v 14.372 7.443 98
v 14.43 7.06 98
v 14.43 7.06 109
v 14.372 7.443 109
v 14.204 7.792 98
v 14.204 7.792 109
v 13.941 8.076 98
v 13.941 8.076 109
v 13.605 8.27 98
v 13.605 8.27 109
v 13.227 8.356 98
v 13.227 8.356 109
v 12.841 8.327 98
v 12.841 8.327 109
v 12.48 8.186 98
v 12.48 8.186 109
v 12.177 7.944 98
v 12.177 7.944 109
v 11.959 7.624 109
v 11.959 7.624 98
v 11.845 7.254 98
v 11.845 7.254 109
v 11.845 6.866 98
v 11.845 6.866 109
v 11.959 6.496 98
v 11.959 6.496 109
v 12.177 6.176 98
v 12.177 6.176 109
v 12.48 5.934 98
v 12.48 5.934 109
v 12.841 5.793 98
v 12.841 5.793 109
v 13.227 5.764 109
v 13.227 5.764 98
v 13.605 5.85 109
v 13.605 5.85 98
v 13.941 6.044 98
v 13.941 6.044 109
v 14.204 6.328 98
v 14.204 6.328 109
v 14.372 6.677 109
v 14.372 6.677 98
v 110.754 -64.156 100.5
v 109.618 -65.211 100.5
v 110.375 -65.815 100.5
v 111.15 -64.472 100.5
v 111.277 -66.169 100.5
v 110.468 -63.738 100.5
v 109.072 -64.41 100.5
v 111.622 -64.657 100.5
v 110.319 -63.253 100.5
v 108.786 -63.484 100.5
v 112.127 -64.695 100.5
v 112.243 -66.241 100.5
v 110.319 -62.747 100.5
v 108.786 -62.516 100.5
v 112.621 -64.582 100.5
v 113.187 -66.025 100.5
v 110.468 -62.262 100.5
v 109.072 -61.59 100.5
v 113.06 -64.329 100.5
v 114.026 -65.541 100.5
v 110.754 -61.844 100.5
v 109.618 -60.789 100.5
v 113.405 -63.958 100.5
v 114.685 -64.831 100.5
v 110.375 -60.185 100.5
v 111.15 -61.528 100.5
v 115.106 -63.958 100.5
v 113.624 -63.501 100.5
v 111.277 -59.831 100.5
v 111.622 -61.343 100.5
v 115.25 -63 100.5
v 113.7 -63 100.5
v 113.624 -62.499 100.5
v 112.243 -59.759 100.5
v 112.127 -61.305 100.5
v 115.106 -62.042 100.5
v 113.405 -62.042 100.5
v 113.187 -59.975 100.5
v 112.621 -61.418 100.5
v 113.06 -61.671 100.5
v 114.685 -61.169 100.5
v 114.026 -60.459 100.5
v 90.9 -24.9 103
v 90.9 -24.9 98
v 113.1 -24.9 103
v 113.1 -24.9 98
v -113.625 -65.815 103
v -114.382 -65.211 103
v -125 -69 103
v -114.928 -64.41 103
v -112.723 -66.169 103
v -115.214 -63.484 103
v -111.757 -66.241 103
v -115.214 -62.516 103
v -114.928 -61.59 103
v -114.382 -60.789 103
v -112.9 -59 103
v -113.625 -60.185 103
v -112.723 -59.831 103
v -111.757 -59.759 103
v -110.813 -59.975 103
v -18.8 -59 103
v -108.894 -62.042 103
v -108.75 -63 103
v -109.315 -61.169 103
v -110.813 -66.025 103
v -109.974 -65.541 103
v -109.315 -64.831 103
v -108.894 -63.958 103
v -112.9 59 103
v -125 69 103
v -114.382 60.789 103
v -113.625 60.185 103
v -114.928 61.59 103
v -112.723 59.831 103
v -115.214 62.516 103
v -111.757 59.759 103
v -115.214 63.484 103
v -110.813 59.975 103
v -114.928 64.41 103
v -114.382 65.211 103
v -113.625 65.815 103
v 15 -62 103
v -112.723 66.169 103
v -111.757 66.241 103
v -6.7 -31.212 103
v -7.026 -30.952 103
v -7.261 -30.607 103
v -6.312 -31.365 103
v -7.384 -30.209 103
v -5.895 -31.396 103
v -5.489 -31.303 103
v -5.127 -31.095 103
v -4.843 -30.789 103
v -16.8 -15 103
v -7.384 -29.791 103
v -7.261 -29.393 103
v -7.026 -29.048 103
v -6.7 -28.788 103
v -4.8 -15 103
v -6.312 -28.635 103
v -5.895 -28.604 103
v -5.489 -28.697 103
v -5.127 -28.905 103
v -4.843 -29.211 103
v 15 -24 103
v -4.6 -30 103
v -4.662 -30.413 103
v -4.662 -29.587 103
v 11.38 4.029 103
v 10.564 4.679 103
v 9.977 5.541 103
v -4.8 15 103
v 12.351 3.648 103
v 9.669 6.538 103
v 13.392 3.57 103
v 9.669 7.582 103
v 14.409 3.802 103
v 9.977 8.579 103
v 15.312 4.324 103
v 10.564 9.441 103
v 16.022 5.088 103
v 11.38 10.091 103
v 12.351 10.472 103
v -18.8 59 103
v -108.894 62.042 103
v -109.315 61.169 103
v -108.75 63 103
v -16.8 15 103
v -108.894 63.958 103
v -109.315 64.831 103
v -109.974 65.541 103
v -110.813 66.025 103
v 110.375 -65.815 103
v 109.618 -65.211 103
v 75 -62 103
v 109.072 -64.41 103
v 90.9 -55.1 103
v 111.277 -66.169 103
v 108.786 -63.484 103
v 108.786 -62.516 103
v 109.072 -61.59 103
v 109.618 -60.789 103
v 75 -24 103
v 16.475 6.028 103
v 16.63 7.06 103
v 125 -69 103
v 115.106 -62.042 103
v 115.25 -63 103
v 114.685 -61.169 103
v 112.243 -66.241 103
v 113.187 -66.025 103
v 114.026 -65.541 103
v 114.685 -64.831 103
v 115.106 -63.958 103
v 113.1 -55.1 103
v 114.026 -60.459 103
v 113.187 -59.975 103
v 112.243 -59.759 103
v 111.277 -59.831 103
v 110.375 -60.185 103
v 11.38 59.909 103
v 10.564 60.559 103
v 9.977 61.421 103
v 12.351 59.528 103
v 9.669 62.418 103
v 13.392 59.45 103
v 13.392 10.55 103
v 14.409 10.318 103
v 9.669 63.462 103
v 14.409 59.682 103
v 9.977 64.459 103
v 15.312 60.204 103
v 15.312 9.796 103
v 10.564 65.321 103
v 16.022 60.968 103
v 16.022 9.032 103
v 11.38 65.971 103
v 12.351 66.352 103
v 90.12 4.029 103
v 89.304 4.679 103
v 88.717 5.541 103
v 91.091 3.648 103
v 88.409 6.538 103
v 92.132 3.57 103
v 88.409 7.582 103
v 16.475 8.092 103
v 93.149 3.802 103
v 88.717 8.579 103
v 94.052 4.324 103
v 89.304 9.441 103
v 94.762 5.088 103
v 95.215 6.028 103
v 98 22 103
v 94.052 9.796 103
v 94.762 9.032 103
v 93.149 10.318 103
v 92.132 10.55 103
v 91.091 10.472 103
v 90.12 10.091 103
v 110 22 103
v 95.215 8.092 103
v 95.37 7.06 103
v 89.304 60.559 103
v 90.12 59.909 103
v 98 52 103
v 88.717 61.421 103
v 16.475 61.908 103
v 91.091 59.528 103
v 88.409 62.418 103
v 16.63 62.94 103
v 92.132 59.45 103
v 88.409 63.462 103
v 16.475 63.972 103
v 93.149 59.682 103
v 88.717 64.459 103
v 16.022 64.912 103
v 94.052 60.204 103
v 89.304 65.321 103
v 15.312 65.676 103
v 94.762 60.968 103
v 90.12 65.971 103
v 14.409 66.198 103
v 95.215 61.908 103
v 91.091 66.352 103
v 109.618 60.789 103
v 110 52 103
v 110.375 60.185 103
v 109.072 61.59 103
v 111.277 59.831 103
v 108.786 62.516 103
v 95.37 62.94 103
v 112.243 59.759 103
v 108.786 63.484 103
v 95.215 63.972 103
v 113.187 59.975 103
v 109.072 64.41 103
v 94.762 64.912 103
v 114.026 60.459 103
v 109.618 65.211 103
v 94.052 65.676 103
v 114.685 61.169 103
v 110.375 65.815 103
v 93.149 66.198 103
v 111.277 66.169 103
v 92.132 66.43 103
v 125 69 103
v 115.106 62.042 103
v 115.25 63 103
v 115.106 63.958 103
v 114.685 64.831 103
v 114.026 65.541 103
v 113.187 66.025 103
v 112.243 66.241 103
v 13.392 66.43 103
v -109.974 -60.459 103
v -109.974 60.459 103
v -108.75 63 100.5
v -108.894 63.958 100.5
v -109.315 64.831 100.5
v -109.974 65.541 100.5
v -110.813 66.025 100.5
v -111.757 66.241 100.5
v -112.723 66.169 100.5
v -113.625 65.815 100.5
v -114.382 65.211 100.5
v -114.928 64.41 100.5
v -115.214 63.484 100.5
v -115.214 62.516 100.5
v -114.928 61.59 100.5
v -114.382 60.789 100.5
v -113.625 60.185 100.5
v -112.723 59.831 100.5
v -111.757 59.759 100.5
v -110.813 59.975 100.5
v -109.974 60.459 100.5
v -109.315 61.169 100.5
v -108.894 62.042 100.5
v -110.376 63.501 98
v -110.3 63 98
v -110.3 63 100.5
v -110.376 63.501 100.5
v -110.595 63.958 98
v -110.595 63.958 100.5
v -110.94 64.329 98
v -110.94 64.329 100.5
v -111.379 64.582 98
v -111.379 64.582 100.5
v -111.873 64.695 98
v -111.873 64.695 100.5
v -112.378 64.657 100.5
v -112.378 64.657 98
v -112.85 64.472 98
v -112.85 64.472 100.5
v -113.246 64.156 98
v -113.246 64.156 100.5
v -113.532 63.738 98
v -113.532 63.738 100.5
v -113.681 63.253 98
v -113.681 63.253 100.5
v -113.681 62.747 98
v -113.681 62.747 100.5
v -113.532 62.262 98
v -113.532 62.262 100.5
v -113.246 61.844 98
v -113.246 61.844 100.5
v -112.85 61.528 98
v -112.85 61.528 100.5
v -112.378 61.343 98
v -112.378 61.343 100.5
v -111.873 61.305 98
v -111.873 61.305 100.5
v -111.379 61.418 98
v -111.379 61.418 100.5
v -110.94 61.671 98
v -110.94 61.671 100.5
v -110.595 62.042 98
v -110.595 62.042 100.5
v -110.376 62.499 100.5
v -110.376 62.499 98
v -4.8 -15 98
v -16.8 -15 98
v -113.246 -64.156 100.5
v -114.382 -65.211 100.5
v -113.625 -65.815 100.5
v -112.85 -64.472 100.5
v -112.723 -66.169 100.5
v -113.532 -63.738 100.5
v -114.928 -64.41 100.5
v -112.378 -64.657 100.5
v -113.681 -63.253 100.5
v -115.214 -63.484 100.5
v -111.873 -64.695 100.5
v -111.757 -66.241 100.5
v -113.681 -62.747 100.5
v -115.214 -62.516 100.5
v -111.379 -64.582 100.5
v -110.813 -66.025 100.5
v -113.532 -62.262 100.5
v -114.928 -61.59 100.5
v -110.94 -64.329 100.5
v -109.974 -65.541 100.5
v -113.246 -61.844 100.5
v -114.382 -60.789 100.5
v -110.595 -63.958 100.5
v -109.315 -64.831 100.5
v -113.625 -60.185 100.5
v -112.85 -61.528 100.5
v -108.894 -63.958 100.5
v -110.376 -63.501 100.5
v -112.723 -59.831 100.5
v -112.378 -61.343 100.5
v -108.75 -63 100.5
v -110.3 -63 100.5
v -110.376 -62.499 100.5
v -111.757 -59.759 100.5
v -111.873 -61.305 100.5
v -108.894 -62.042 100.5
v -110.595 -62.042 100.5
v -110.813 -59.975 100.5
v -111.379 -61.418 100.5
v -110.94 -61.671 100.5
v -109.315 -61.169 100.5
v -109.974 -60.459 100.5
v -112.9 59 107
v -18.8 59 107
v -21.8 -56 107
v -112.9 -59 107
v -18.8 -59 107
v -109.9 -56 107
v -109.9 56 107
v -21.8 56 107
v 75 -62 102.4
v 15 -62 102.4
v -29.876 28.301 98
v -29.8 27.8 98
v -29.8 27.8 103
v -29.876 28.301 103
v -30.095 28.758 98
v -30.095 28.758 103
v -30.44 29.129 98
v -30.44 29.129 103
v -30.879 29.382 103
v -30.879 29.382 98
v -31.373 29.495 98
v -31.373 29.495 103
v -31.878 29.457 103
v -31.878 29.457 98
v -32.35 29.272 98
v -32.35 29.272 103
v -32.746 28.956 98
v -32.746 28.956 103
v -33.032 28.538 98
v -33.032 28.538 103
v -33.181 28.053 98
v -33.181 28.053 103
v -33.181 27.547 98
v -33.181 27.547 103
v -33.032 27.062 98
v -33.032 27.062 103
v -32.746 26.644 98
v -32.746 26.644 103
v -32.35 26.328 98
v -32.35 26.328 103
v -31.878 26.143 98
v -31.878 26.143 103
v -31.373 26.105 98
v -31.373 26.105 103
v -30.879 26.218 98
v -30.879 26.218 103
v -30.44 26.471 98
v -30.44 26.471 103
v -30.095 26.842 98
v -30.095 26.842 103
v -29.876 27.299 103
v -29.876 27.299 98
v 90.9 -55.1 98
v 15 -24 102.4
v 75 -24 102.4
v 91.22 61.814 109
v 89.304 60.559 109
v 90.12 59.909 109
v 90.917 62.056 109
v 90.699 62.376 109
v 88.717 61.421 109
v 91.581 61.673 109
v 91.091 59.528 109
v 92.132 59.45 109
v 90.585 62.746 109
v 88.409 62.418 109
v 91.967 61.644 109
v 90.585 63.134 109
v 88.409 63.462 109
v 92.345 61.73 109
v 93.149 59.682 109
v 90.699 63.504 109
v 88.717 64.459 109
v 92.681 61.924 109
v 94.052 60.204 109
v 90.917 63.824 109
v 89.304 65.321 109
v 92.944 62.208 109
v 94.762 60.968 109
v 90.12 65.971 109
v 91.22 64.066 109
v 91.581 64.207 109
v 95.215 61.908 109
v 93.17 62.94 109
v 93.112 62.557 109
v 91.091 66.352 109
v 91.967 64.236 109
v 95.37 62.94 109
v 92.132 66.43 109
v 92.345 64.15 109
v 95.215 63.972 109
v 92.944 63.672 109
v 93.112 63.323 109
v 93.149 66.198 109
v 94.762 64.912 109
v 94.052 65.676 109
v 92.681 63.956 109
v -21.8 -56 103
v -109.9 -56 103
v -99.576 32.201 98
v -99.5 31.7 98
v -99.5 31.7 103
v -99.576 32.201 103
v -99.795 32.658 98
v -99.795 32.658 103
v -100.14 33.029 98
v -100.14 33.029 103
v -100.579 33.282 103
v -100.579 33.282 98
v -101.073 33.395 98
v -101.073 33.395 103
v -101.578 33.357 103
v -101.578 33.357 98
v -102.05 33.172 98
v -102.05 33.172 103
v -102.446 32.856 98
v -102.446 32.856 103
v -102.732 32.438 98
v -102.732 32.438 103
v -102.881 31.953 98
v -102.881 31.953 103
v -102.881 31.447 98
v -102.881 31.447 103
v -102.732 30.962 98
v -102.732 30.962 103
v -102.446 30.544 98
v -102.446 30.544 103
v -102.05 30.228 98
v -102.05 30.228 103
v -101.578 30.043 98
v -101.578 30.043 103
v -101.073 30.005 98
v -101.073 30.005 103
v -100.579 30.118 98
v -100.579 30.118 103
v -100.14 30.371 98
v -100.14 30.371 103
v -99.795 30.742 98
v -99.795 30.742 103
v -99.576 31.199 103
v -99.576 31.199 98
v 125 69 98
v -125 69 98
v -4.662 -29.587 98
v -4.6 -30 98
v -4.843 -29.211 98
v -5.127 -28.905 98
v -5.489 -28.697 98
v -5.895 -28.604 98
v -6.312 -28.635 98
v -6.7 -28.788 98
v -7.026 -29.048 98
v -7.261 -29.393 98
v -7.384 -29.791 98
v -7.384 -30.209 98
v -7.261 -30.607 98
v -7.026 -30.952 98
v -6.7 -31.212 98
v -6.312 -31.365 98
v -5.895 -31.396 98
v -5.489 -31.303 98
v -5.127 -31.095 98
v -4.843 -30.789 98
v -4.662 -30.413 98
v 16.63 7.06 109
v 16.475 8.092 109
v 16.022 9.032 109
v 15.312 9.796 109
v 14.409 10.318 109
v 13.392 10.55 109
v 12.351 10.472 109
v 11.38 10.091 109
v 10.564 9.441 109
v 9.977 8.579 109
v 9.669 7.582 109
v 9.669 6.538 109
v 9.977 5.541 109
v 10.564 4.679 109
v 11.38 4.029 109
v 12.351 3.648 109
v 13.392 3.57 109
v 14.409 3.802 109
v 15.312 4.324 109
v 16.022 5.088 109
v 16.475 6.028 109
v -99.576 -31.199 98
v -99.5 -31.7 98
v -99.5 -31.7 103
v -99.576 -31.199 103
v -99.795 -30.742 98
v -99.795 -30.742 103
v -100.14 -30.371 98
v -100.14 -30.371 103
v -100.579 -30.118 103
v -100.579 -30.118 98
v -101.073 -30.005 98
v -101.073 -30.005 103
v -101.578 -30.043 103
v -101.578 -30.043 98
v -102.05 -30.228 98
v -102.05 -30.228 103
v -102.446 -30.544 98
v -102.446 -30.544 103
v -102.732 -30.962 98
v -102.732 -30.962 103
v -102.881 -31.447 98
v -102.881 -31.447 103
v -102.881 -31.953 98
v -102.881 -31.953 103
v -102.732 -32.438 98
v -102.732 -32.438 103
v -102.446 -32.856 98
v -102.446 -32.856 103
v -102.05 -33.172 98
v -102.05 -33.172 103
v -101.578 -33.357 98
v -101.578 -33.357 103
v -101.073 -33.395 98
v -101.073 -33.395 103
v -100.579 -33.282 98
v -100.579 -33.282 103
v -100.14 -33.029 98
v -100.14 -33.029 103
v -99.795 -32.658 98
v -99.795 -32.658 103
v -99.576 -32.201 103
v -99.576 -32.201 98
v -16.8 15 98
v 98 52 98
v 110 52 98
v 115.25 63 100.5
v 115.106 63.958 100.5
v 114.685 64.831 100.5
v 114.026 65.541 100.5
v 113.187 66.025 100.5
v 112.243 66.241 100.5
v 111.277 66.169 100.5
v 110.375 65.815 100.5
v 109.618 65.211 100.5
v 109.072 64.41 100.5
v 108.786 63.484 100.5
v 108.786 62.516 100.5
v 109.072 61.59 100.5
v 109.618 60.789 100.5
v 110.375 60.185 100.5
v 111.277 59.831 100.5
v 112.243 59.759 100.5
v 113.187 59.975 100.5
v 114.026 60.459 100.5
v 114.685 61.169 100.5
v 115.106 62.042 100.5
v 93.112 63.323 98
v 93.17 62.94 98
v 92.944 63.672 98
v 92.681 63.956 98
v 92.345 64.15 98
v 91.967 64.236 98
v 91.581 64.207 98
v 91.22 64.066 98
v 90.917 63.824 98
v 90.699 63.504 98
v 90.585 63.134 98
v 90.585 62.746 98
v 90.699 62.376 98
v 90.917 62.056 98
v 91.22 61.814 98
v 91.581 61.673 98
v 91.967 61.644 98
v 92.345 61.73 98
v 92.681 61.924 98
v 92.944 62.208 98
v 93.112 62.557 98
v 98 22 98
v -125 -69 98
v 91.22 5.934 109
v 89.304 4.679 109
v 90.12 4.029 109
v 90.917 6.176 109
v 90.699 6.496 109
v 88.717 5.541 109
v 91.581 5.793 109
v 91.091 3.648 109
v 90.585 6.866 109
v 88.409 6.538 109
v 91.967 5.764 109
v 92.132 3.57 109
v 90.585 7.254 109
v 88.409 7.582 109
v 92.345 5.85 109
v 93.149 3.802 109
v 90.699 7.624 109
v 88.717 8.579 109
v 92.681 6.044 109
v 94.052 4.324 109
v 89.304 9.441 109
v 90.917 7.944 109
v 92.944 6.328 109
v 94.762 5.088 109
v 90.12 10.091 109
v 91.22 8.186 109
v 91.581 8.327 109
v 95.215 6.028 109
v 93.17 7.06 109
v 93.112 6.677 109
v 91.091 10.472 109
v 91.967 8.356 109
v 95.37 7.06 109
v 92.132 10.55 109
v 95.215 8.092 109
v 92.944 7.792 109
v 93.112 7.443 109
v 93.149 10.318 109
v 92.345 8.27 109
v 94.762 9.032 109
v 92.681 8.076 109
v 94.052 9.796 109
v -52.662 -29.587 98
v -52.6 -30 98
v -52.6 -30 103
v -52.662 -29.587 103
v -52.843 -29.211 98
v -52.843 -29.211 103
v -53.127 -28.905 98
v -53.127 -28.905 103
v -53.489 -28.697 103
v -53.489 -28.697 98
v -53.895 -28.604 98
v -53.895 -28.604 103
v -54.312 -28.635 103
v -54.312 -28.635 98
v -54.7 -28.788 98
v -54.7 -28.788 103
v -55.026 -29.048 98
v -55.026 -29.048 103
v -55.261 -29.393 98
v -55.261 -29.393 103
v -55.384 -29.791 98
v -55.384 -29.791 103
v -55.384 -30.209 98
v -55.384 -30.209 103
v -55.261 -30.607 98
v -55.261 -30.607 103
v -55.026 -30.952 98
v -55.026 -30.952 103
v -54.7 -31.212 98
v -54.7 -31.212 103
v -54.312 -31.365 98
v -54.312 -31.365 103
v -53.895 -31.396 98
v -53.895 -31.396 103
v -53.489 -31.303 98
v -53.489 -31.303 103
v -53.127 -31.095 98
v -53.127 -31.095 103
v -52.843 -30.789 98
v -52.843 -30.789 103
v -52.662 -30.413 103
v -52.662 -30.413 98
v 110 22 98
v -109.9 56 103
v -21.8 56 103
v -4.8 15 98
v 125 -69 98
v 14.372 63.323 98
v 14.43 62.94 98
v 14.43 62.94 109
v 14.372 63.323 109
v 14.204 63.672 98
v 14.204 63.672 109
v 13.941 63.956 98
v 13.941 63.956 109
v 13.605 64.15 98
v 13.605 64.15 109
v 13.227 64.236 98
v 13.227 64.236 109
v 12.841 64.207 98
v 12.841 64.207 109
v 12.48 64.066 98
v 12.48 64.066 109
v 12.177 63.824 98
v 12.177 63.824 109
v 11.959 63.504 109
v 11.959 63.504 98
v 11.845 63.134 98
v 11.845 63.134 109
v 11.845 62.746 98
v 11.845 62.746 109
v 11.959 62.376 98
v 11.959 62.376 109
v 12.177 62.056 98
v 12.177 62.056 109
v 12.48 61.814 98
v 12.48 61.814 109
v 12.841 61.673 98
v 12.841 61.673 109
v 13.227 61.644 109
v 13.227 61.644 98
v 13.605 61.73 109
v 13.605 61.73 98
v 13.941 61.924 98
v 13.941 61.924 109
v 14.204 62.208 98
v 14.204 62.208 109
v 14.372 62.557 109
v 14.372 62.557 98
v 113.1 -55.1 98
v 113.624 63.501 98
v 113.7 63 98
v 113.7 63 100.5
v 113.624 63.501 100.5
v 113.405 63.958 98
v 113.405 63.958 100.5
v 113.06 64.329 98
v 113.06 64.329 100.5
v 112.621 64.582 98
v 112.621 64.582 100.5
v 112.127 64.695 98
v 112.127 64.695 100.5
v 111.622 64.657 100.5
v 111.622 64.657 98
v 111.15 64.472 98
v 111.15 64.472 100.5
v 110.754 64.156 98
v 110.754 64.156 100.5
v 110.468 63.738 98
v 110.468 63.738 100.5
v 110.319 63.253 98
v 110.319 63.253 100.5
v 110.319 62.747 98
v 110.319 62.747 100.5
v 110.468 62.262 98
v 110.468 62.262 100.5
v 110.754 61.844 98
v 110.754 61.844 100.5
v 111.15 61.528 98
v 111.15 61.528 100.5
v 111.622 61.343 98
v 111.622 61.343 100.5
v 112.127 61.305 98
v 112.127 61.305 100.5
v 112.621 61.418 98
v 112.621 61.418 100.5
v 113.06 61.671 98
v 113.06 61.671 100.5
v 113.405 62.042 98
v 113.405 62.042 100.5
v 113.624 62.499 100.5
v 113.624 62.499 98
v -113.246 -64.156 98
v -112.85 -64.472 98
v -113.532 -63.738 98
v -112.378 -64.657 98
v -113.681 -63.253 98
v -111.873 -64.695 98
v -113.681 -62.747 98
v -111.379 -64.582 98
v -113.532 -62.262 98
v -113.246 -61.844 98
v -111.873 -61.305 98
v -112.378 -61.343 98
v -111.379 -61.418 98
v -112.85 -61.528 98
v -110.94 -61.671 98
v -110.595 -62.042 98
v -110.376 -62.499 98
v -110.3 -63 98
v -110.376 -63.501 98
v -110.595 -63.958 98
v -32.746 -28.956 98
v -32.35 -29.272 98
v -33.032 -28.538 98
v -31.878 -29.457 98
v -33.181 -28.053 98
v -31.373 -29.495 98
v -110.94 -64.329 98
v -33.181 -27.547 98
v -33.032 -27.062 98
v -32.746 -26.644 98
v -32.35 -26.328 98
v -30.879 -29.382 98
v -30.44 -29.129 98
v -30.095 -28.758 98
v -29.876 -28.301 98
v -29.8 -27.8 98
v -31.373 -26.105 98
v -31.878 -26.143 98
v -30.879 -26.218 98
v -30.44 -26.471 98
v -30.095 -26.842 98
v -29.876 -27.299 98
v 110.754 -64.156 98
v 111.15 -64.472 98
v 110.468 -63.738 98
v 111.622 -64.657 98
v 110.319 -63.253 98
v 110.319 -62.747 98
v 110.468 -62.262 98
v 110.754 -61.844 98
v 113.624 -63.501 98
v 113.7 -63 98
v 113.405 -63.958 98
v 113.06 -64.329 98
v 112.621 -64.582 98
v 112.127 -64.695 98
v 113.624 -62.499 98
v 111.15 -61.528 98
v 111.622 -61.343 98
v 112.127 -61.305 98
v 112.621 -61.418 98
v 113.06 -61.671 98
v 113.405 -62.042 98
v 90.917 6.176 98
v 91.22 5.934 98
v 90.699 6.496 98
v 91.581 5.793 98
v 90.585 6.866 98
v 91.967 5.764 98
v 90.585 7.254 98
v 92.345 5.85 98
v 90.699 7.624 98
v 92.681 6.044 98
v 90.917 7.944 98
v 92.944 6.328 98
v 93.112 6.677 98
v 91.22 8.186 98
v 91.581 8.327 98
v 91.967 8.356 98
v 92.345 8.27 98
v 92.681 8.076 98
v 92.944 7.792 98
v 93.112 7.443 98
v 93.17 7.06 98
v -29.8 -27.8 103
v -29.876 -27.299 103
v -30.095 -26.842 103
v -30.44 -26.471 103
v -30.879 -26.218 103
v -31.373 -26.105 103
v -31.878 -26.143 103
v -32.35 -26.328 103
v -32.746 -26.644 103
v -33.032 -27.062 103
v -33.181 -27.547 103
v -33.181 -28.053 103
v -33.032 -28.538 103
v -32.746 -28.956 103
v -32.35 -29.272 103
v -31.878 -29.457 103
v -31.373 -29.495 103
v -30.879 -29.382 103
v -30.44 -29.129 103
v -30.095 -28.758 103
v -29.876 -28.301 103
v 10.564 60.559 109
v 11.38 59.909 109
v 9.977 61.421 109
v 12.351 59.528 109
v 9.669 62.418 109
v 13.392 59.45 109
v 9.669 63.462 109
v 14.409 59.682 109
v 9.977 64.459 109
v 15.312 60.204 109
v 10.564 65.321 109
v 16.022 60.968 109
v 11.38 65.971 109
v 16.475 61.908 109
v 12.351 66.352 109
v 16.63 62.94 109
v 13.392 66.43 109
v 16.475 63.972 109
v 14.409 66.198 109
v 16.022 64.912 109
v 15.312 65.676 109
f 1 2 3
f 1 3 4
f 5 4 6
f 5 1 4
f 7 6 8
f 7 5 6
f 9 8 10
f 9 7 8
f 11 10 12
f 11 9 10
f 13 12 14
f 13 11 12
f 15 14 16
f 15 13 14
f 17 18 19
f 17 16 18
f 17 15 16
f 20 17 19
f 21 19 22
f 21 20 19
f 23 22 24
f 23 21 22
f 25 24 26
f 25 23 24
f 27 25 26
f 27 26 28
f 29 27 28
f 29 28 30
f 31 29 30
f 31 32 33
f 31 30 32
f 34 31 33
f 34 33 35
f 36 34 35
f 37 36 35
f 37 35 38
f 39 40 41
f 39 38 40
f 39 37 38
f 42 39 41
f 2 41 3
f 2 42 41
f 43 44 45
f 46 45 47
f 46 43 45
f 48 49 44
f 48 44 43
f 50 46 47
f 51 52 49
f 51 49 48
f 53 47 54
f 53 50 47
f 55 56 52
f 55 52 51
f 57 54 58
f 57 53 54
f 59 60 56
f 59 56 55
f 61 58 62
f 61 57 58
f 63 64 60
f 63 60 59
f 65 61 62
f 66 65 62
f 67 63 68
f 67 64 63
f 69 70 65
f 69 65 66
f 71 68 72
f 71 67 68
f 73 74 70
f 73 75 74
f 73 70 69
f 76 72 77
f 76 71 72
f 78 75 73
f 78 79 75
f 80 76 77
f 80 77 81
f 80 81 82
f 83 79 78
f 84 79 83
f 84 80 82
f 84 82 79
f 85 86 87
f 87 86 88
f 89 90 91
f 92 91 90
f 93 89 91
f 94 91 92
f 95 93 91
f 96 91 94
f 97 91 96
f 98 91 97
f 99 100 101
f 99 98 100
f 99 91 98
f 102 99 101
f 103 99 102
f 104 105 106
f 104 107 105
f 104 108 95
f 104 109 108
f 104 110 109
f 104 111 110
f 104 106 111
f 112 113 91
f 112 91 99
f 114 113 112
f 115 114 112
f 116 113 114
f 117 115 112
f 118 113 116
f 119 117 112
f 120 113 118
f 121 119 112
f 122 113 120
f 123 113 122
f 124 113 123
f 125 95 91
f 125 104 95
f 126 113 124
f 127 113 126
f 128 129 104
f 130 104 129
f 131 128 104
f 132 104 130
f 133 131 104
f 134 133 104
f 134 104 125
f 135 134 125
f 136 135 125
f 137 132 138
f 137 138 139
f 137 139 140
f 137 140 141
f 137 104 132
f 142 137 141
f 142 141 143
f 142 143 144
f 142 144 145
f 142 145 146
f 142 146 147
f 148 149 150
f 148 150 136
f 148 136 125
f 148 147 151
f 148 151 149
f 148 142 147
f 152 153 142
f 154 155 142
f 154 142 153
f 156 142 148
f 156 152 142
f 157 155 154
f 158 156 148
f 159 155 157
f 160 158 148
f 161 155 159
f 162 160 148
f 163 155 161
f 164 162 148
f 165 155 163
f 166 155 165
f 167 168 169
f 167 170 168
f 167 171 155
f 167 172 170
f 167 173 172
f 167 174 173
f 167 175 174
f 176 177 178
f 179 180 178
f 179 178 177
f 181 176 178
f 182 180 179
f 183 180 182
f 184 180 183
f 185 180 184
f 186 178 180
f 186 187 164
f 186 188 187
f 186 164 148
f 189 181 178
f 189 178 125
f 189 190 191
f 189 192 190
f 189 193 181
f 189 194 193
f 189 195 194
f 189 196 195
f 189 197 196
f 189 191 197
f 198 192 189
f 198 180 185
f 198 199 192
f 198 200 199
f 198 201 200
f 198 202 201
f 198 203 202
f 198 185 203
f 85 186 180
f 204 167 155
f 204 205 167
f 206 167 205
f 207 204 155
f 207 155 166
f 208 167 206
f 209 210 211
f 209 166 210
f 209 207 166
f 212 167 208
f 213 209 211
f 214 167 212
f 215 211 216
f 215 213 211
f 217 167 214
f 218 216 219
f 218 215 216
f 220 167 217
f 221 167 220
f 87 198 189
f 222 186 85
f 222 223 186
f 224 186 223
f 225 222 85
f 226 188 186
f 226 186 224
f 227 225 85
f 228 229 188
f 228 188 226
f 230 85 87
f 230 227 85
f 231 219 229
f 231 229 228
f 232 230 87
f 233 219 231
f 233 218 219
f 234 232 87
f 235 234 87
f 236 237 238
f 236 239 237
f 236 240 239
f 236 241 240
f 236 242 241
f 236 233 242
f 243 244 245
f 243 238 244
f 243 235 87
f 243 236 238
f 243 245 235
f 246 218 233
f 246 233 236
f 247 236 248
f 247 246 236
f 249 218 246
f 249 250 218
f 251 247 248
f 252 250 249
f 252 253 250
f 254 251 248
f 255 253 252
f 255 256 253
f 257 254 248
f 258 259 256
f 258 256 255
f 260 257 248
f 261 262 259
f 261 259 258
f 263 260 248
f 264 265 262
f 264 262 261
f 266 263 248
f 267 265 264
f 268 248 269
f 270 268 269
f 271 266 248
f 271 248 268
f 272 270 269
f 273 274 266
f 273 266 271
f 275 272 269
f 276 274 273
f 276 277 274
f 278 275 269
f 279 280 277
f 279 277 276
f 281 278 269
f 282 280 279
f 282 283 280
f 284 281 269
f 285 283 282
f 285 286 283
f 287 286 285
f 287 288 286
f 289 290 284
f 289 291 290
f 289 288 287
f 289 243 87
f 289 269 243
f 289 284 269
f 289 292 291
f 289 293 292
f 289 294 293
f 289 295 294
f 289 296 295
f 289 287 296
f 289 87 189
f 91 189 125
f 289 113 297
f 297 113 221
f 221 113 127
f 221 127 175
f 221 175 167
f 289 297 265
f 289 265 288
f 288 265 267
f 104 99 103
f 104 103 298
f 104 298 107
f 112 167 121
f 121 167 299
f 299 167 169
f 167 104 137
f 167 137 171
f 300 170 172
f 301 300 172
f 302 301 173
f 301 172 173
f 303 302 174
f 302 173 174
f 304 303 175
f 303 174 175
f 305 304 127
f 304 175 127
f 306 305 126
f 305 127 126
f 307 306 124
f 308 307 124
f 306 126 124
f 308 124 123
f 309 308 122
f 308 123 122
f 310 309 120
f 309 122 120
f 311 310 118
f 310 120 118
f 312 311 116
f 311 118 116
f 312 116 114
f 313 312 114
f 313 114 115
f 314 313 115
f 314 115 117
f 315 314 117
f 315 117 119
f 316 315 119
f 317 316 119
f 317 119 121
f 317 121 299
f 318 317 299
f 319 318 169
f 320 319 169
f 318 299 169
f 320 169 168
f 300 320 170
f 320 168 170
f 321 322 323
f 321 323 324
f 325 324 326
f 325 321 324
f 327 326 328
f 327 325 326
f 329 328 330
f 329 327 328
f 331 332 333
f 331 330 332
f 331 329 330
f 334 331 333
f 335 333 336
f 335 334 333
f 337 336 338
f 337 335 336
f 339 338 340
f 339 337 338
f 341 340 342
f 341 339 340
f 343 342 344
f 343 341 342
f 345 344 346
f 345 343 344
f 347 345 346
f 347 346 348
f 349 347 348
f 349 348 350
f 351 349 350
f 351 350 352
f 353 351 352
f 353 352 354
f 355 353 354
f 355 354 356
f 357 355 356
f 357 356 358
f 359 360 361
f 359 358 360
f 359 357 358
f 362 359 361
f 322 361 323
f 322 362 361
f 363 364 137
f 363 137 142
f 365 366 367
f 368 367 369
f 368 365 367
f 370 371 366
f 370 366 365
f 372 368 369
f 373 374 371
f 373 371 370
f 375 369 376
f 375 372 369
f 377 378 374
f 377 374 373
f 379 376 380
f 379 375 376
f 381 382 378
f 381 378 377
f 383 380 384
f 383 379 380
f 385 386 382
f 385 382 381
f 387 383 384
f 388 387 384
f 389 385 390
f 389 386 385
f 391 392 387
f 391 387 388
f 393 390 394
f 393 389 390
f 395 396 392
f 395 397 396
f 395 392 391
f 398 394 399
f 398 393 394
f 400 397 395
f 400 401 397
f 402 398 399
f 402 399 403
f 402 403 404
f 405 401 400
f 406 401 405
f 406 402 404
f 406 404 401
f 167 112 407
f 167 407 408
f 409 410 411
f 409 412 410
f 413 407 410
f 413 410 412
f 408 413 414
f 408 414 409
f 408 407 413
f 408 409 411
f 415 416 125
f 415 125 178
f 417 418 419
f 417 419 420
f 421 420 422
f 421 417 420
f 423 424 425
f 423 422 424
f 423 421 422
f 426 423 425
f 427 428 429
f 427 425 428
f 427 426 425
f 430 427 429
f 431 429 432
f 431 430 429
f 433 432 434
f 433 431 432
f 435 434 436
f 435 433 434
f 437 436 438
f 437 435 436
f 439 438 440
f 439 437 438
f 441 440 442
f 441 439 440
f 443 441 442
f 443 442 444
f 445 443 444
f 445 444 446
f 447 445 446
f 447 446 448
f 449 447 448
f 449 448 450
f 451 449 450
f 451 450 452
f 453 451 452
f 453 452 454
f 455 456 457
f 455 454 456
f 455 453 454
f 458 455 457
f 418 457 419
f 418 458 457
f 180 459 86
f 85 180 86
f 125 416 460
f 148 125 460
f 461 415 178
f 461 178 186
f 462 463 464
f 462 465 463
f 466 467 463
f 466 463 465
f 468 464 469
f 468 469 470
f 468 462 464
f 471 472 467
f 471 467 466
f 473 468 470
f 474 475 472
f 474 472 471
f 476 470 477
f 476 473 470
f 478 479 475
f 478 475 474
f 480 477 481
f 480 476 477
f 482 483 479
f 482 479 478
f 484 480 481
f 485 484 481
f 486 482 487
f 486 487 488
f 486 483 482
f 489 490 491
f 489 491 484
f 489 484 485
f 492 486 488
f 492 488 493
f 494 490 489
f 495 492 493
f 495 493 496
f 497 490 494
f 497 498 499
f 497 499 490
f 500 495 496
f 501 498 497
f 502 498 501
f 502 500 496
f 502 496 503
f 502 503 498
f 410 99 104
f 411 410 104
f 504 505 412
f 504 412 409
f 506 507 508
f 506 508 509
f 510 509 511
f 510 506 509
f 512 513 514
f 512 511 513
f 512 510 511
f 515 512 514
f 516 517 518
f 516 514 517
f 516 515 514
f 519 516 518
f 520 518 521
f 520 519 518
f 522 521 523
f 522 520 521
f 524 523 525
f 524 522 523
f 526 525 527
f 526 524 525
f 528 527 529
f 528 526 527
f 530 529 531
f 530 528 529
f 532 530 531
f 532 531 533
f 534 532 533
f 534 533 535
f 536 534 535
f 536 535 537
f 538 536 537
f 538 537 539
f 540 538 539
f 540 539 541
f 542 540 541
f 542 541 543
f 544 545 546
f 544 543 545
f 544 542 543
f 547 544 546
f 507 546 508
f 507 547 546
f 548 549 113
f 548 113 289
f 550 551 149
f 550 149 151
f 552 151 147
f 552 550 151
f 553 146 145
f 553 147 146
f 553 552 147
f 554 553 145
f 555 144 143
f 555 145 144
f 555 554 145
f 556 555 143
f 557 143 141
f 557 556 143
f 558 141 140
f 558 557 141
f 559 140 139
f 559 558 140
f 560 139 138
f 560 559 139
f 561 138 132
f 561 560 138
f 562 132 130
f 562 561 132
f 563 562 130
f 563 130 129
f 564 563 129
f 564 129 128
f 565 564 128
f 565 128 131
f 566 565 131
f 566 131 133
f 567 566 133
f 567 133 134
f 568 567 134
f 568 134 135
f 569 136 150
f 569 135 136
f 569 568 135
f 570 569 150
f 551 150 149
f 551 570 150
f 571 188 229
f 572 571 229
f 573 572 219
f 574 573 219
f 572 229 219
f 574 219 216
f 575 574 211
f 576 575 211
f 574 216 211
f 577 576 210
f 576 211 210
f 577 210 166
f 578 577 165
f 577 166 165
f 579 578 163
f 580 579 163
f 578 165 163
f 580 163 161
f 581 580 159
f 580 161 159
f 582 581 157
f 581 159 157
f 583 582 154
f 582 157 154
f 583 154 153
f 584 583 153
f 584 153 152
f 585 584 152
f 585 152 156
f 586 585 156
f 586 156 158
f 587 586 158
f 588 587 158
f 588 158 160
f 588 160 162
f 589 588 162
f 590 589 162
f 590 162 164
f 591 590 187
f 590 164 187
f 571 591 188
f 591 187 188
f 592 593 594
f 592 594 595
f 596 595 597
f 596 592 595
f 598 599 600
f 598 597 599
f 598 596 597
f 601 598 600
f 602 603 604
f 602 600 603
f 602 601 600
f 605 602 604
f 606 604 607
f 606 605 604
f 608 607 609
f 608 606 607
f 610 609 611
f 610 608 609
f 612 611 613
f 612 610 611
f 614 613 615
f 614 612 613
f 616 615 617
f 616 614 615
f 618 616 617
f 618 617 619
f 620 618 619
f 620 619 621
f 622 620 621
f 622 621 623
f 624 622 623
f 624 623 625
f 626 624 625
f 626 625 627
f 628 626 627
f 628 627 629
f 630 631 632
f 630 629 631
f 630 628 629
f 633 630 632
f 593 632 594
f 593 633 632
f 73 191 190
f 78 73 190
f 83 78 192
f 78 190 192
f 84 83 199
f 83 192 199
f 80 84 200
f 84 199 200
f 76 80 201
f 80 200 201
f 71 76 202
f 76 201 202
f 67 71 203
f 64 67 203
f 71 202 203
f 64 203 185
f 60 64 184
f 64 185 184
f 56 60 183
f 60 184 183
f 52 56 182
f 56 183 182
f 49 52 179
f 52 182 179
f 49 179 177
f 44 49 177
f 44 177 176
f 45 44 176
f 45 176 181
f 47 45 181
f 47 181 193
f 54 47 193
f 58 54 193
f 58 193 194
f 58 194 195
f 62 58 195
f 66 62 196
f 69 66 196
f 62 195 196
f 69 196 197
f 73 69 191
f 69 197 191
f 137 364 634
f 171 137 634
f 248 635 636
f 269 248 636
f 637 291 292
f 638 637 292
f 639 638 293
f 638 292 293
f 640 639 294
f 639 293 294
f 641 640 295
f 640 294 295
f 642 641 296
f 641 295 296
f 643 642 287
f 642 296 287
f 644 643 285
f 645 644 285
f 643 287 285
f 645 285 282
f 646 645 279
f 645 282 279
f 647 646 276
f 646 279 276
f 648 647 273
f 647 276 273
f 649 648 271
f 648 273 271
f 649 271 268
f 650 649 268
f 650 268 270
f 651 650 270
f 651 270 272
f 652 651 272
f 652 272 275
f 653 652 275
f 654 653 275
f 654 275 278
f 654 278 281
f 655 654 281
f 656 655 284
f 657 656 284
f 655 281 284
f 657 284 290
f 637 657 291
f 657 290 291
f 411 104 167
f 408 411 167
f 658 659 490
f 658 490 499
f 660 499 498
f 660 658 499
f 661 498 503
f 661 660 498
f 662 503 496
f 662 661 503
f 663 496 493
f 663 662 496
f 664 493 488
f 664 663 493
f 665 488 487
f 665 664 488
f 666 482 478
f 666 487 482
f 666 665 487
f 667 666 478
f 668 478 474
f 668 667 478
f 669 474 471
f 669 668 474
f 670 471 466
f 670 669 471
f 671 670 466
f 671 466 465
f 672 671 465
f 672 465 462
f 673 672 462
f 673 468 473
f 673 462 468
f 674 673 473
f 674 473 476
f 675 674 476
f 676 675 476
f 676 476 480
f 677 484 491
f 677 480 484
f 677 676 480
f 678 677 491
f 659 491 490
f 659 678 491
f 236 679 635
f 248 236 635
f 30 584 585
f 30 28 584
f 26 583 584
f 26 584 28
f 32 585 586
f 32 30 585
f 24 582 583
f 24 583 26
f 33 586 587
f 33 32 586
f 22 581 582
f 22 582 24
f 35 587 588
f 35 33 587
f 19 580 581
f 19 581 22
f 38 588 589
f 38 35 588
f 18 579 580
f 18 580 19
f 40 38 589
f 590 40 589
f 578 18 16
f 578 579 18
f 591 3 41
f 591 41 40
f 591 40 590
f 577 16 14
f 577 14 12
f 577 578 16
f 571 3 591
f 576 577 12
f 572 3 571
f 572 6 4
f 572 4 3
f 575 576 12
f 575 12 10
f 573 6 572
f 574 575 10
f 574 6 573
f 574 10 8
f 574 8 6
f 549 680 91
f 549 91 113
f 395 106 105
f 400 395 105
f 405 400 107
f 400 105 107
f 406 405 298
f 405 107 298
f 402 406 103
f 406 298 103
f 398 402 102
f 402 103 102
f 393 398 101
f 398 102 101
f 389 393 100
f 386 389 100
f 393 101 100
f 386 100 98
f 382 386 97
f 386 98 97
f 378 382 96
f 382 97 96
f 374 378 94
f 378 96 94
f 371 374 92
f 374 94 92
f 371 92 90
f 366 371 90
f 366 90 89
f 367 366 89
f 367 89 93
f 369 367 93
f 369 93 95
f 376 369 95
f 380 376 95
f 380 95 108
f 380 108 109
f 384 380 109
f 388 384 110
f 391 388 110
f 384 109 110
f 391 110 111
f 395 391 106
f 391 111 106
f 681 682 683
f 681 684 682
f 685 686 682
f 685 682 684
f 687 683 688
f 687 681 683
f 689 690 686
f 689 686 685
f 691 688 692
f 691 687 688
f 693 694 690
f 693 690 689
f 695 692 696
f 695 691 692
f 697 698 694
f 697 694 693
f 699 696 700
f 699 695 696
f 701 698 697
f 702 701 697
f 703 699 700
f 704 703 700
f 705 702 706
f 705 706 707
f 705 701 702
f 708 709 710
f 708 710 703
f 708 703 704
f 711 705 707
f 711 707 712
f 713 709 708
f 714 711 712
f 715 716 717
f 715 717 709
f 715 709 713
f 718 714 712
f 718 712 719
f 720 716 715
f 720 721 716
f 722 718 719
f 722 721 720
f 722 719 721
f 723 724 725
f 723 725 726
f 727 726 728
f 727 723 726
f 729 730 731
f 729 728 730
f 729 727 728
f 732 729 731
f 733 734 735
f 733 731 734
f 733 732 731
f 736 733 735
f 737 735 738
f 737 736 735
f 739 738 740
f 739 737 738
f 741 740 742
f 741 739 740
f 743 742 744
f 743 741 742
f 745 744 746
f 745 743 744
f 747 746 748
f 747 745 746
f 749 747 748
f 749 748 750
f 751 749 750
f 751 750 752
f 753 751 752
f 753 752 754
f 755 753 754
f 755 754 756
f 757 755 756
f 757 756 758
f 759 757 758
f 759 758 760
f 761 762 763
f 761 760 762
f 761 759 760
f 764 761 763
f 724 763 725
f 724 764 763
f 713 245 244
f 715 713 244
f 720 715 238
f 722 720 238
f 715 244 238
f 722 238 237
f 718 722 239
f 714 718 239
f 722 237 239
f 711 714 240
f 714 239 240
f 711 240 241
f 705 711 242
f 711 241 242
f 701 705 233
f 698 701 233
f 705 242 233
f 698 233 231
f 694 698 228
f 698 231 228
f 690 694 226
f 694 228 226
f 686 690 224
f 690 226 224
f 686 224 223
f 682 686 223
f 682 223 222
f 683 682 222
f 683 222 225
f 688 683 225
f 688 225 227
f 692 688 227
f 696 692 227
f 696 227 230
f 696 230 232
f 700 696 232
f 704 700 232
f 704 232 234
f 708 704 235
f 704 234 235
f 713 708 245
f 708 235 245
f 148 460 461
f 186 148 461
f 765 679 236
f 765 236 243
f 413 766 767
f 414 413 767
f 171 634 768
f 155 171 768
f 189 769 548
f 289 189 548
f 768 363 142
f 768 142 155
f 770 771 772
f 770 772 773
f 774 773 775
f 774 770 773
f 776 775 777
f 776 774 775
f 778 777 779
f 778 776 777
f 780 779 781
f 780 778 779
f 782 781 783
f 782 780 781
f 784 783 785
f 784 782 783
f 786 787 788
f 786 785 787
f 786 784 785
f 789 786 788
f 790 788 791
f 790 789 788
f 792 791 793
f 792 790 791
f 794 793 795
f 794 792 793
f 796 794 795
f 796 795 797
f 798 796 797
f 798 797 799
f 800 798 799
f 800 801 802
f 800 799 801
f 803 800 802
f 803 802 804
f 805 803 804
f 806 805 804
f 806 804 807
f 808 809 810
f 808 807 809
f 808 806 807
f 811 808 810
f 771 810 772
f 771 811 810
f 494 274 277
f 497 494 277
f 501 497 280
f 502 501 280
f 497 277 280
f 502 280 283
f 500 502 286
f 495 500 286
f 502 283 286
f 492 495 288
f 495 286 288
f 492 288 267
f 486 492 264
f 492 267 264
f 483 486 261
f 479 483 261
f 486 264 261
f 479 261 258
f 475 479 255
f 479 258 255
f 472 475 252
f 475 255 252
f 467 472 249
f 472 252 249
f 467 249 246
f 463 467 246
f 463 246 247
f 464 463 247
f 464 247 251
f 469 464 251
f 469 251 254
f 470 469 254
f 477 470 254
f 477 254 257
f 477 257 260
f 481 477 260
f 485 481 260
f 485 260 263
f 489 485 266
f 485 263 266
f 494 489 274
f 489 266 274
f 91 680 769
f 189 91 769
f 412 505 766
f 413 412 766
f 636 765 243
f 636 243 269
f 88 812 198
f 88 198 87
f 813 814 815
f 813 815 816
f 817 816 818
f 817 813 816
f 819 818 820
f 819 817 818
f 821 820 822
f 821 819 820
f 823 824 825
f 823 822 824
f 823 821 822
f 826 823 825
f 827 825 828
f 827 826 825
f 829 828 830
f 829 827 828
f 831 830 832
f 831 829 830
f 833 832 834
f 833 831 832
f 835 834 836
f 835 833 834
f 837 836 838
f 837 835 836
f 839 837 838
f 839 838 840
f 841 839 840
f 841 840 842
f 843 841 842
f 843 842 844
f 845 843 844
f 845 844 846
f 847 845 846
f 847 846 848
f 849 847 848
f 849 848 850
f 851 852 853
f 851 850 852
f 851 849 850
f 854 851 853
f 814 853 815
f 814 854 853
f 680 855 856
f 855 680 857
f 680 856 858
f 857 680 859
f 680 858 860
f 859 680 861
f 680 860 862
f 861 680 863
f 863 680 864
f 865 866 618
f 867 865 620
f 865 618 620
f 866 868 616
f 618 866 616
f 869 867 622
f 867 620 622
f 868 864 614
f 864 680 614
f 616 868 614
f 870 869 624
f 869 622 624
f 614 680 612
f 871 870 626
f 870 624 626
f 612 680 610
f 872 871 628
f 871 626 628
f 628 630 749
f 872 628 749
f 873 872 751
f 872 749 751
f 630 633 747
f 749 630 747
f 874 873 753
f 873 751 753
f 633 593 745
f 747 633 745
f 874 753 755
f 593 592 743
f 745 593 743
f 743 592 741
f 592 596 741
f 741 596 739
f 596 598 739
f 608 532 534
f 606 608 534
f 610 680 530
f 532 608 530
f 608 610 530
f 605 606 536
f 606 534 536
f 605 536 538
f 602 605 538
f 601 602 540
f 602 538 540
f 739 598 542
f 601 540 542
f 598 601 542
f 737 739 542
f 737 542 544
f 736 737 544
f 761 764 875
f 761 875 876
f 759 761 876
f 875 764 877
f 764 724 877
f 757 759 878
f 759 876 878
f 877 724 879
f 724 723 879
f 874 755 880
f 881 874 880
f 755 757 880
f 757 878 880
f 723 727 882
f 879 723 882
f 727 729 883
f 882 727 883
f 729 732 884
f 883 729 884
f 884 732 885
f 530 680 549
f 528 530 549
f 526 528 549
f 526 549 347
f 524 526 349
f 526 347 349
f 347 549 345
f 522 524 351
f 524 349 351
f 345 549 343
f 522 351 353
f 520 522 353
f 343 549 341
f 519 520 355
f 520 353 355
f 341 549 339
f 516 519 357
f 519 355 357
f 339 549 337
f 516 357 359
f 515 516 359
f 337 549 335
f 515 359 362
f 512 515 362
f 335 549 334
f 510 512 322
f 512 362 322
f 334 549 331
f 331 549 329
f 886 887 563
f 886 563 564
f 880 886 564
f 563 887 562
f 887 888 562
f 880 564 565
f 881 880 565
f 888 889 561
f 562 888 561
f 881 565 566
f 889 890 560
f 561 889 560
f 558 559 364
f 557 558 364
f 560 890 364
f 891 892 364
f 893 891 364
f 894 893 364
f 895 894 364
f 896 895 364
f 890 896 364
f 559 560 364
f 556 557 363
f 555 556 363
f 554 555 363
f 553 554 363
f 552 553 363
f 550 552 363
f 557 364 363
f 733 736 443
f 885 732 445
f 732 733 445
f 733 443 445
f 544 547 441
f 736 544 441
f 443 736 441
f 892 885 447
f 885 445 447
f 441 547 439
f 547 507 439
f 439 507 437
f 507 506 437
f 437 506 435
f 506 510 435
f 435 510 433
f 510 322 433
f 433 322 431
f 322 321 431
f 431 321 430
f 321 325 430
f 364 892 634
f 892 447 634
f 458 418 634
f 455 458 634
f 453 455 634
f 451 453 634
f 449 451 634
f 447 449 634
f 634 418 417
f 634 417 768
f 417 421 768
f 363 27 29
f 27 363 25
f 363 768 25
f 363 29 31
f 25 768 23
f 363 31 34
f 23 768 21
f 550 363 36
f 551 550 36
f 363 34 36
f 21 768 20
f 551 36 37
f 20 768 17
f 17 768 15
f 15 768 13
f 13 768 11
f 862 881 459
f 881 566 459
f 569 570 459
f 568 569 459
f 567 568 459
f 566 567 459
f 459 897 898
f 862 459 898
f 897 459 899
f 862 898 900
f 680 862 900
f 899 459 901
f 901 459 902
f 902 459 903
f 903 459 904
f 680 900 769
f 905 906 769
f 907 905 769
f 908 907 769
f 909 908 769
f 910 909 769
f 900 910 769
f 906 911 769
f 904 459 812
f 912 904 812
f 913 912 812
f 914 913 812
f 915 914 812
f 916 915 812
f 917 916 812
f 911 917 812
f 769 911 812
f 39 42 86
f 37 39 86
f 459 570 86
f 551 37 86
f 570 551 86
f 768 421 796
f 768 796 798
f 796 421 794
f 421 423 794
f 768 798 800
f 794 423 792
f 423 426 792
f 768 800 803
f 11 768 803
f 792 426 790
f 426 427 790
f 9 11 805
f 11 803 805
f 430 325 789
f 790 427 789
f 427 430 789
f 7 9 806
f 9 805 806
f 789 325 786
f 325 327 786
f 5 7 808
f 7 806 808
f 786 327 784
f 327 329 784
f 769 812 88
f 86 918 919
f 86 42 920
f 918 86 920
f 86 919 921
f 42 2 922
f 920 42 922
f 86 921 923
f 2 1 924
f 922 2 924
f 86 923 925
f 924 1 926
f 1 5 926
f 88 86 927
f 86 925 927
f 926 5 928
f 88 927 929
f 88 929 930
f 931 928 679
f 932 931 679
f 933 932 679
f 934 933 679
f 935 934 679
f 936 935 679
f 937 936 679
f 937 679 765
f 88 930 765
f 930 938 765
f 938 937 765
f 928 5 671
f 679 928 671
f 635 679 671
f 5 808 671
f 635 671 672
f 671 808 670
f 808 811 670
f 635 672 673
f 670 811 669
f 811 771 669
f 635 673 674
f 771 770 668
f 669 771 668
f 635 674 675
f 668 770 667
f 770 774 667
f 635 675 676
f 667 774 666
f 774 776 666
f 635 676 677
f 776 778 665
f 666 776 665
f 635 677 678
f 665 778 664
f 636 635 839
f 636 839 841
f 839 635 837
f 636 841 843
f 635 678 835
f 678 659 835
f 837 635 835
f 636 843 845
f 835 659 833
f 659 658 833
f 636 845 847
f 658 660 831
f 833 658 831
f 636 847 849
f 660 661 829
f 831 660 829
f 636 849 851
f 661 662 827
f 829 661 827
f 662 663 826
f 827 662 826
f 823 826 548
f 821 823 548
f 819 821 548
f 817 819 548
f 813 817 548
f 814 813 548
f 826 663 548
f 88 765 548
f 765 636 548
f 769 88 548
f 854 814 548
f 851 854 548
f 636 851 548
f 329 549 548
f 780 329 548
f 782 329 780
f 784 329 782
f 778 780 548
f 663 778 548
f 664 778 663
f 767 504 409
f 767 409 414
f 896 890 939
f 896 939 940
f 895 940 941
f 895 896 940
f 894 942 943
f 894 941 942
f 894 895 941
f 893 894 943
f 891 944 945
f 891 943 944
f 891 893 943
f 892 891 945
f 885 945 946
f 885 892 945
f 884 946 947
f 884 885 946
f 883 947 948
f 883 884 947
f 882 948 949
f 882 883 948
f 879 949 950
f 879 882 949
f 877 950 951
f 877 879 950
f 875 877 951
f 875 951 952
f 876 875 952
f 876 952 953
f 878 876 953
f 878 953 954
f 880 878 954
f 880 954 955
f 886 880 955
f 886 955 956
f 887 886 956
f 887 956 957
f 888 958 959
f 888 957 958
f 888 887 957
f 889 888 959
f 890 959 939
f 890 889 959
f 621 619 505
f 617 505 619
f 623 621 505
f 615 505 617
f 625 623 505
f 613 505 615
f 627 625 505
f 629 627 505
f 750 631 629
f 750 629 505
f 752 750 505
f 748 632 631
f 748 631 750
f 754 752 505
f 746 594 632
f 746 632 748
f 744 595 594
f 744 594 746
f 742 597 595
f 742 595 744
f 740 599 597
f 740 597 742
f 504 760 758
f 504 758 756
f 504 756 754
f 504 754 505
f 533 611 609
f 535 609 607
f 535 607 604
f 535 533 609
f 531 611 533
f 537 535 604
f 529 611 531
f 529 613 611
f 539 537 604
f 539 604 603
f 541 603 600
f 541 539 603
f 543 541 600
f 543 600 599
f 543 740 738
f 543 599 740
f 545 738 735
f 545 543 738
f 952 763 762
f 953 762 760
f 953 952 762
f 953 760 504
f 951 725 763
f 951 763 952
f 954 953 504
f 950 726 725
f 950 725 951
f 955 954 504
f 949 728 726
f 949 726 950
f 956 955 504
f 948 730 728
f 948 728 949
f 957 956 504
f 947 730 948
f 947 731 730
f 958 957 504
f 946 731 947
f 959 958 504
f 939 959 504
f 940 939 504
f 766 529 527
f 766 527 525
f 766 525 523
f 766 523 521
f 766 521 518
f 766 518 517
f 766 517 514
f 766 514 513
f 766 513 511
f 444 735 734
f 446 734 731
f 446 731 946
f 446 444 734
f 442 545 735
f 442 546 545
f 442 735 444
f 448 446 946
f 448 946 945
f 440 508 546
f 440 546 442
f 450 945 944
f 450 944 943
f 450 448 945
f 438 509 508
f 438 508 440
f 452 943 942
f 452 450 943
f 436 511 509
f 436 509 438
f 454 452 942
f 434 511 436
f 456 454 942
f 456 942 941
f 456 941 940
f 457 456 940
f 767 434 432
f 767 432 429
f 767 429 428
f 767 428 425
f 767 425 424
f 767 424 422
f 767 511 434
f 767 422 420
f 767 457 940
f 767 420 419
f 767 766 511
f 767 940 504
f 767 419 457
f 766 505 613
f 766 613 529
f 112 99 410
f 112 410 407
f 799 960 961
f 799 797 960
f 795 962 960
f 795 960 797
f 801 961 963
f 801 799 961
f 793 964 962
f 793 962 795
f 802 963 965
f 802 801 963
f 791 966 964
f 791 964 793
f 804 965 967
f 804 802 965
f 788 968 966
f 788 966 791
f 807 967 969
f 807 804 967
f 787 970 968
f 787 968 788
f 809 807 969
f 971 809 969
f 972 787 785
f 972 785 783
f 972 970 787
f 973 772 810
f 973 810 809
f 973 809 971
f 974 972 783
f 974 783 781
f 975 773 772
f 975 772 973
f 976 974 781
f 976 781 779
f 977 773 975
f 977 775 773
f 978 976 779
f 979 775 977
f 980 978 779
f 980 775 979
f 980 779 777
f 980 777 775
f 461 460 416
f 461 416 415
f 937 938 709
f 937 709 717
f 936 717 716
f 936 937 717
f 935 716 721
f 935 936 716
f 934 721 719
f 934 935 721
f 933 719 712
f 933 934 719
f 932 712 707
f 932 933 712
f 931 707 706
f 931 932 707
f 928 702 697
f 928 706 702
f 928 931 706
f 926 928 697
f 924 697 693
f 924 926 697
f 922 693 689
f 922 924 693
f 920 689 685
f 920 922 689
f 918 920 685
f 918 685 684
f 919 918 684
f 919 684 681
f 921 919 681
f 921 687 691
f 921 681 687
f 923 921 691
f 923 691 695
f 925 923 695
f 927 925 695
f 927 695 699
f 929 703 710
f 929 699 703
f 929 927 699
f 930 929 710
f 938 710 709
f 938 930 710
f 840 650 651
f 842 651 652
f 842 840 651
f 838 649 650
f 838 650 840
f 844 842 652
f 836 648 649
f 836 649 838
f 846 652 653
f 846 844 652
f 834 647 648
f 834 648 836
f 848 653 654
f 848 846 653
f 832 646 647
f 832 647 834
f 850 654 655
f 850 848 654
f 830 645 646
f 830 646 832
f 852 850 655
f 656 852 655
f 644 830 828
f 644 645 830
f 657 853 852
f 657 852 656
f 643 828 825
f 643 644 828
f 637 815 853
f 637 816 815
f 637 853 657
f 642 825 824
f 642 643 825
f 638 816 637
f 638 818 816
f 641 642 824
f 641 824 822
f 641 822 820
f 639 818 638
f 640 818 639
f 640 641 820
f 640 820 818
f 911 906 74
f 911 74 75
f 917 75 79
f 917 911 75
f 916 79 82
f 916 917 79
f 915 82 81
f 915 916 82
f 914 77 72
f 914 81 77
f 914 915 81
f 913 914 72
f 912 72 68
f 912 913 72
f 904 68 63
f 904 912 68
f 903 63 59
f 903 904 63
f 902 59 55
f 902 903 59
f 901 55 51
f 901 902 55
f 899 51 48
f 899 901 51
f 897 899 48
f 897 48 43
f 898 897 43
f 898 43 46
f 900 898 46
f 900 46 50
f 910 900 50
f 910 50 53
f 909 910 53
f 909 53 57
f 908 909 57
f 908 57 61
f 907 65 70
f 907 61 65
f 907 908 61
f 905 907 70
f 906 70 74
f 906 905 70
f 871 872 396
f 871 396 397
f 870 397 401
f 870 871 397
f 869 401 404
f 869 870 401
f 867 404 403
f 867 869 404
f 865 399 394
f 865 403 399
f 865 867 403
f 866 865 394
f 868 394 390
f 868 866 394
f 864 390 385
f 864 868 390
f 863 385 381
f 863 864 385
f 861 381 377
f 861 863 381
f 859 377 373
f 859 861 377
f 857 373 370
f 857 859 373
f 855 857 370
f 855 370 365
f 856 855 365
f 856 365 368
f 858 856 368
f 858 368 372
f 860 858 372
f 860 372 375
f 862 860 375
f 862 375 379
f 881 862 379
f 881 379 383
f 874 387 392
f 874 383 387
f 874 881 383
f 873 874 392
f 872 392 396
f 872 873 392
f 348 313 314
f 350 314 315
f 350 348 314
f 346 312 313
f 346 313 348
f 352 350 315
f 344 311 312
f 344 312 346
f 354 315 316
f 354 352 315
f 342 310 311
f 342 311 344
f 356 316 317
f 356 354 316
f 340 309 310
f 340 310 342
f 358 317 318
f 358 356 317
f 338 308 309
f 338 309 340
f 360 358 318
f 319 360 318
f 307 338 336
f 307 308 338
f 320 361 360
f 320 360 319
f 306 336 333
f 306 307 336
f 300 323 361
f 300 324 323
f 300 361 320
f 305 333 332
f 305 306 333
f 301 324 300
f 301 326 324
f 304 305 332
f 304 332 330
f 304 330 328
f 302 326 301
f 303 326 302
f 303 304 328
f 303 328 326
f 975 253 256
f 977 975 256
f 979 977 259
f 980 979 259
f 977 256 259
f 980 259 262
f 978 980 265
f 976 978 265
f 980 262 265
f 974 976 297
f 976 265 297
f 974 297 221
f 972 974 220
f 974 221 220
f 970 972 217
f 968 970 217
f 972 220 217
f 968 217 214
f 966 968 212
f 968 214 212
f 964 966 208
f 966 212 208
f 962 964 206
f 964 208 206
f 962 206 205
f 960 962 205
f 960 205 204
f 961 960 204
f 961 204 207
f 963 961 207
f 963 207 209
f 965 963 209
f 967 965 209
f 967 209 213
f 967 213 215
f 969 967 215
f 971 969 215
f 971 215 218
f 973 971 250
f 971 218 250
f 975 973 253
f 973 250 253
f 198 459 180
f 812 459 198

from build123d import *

# Parameters (mm, degrees)
SKETCH1_W                       = 250
SKETCH1_H                       = 138
PLATE_DEPTH                     = 5
SKETCH2_W                       = 94.1
SKETCH2_H                       = 118
SKETCH2_W_2                     = 88.1
SKETCH2_H_2                     = 112
ARM_LOCATING_FENCE_DEPTH        = 4
SKETCH3_R                       = 1.7
ARM_M3_HOLES_DEPTH              = 7
SKETCH4_R                       = 1.7
DECK_M3_HOLES_DEPTH             = 7
SKETCH5_R                       = 3.25
DECK_COUNTERBORES_DEPTH         = 2.5
SKETCH6_W                       = 22.2
SKETCH6_H                       = 30.2
KILL_SWITCH_CUTOUT_DEPTH        = 7
SKETCH7_W                       = 12
SKETCH7_H                       = 30
SERVO_CABLE_SLOT_DEPTH          = 7
SKETCH8_R                       = 1.4
ESP32_STANDOFF_HOLES_M2P5_DEPTH = 7
SKETCH9_R                       = 3.5
MDD10A_BOSSES_DEPTH             = 6
SKETCH10_R                      = 1.3
MDD10A_PILOTS_M3_DEPTH          = 13
SKETCH11_W                      = 12
SKETCH11_H                      = 30
MOTOR_WIRE_SLOT_DEPTH           = 7
SKETCH12_W                      = 60
SKETCH12_H                      = 38
NAME_PLATE_RECESS_DEPTH         = 1.6


with BuildPart() as part:
    # Sketch1 → Plate (new body)
    with BuildSketch(Plane.XY.offset(98)):
        Rectangle(SKETCH1_W, SKETCH1_H)
    extrude(amount=PLATE_DEPTH)

    # Sketch2 → Arm_locating_fence (add)
    with BuildSketch(Plane.XY.offset(103)):
        with Locations((-65.85, 0)):
            Rectangle(SKETCH2_W, SKETCH2_H)
        with Locations((-65.85, 0)):
            Rectangle(SKETCH2_W_2, SKETCH2_H_2, mode=Mode.SUBTRACT)
    extrude(amount=ARM_LOCATING_FENCE_DEPTH)

    # Sketch3 → Arm_M3_holes (cut)
    with BuildSketch(Plane.XY.offset(97)):
        with Locations((-101.2, 31.7)):
            Circle(SKETCH3_R)
        with Locations((-101.2, -31.7)):
            Circle(SKETCH3_R)
        with Locations((-31.5, 27.8)):
            Circle(SKETCH3_R)
        with Locations((-31.5, -27.8)):
            Circle(SKETCH3_R)
    extrude(amount=ARM_M3_HOLES_DEPTH, mode=Mode.SUBTRACT)

    # Sketch4 → Deck_M3_holes (cut)
    with BuildSketch(Plane.XY.offset(97)):
        with Locations((-112, 63)):
            Circle(SKETCH4_R)
        with Locations((-112, -63)):
            Circle(SKETCH4_R)
        with Locations((112, 63)):
            Circle(SKETCH4_R)
        with Locations((112, -63)):
            Circle(SKETCH4_R)
    extrude(amount=DECK_M3_HOLES_DEPTH, mode=Mode.SUBTRACT)

    # Sketch5 → Deck_counterbores (cut)
    with BuildSketch(Plane.XY.offset(103)):
        with Locations((-112, 63)):
            Circle(SKETCH5_R)
        with Locations((-112, -63)):
            Circle(SKETCH5_R)
        with Locations((112, 63)):
            Circle(SKETCH5_R)
        with Locations((112, -63)):
            Circle(SKETCH5_R)
    extrude(amount=-DECK_COUNTERBORES_DEPTH, mode=Mode.SUBTRACT)

    # Sketch6 → Kill_switch_cutout (cut)
    with BuildSketch(Plane.XY.offset(97)):
        with Locations((102, -40)):
            Rectangle(SKETCH6_W, SKETCH6_H)
    extrude(amount=KILL_SWITCH_CUTOUT_DEPTH, mode=Mode.SUBTRACT)

    # Sketch7 → Servo_cable_slot (cut)
    with BuildSketch(Plane.XY.offset(97)):
        with Locations((-10.8, 0)):
            Rectangle(SKETCH7_W, SKETCH7_H)
    extrude(amount=SERVO_CABLE_SLOT_DEPTH, mode=Mode.SUBTRACT)

    # Sketch8 → ESP32_standoff_holes_M2p5 (cut)
    with BuildSketch(Plane.XY.offset(97)):
        with Locations((-6, -30)):
            Circle(SKETCH8_R)
        with Locations((-54, -30)):
            Circle(SKETCH8_R)
    extrude(amount=ESP32_STANDOFF_HOLES_M2P5_DEPTH, mode=Mode.SUBTRACT)

    # Sketch9 → MDD10A_bosses (add)
    with BuildSketch(Plane.XY.offset(103)):
        with Locations((13.13, 7.06)):
            Circle(SKETCH9_R)
        with Locations((13.13, 62.94)):
            Circle(SKETCH9_R)
        with Locations((91.87, 7.06)):
            Circle(SKETCH9_R)
        with Locations((91.87, 62.94)):
            Circle(SKETCH9_R)
    extrude(amount=MDD10A_BOSSES_DEPTH)

    # Sketch10 → MDD10A_pilots_M3 (cut)
    with BuildSketch(Plane.XY.offset(97)):
        with Locations((13.13, 7.06)):
            Circle(SKETCH10_R)
        with Locations((13.13, 62.94)):
            Circle(SKETCH10_R)
        with Locations((91.87, 7.06)):
            Circle(SKETCH10_R)
        with Locations((91.87, 62.94)):
            Circle(SKETCH10_R)
    extrude(amount=MDD10A_PILOTS_M3_DEPTH, mode=Mode.SUBTRACT)

    # Sketch11 → Motor_wire_slot (cut)
    with BuildSketch(Plane.XY.offset(97)):
        with Locations((104, 37)):
            Rectangle(SKETCH11_W, SKETCH11_H)
    extrude(amount=MOTOR_WIRE_SLOT_DEPTH, mode=Mode.SUBTRACT)

    # Sketch12 → Name_plate_recess (cut)
    with BuildSketch(Plane.XY.offset(102.4)):
        with Locations((45, -43)):
            Rectangle(SKETCH12_W, SKETCH12_H)
    extrude(amount=NAME_PLATE_RECESS_DEPTH, mode=Mode.SUBTRACT)


solid = part.part
